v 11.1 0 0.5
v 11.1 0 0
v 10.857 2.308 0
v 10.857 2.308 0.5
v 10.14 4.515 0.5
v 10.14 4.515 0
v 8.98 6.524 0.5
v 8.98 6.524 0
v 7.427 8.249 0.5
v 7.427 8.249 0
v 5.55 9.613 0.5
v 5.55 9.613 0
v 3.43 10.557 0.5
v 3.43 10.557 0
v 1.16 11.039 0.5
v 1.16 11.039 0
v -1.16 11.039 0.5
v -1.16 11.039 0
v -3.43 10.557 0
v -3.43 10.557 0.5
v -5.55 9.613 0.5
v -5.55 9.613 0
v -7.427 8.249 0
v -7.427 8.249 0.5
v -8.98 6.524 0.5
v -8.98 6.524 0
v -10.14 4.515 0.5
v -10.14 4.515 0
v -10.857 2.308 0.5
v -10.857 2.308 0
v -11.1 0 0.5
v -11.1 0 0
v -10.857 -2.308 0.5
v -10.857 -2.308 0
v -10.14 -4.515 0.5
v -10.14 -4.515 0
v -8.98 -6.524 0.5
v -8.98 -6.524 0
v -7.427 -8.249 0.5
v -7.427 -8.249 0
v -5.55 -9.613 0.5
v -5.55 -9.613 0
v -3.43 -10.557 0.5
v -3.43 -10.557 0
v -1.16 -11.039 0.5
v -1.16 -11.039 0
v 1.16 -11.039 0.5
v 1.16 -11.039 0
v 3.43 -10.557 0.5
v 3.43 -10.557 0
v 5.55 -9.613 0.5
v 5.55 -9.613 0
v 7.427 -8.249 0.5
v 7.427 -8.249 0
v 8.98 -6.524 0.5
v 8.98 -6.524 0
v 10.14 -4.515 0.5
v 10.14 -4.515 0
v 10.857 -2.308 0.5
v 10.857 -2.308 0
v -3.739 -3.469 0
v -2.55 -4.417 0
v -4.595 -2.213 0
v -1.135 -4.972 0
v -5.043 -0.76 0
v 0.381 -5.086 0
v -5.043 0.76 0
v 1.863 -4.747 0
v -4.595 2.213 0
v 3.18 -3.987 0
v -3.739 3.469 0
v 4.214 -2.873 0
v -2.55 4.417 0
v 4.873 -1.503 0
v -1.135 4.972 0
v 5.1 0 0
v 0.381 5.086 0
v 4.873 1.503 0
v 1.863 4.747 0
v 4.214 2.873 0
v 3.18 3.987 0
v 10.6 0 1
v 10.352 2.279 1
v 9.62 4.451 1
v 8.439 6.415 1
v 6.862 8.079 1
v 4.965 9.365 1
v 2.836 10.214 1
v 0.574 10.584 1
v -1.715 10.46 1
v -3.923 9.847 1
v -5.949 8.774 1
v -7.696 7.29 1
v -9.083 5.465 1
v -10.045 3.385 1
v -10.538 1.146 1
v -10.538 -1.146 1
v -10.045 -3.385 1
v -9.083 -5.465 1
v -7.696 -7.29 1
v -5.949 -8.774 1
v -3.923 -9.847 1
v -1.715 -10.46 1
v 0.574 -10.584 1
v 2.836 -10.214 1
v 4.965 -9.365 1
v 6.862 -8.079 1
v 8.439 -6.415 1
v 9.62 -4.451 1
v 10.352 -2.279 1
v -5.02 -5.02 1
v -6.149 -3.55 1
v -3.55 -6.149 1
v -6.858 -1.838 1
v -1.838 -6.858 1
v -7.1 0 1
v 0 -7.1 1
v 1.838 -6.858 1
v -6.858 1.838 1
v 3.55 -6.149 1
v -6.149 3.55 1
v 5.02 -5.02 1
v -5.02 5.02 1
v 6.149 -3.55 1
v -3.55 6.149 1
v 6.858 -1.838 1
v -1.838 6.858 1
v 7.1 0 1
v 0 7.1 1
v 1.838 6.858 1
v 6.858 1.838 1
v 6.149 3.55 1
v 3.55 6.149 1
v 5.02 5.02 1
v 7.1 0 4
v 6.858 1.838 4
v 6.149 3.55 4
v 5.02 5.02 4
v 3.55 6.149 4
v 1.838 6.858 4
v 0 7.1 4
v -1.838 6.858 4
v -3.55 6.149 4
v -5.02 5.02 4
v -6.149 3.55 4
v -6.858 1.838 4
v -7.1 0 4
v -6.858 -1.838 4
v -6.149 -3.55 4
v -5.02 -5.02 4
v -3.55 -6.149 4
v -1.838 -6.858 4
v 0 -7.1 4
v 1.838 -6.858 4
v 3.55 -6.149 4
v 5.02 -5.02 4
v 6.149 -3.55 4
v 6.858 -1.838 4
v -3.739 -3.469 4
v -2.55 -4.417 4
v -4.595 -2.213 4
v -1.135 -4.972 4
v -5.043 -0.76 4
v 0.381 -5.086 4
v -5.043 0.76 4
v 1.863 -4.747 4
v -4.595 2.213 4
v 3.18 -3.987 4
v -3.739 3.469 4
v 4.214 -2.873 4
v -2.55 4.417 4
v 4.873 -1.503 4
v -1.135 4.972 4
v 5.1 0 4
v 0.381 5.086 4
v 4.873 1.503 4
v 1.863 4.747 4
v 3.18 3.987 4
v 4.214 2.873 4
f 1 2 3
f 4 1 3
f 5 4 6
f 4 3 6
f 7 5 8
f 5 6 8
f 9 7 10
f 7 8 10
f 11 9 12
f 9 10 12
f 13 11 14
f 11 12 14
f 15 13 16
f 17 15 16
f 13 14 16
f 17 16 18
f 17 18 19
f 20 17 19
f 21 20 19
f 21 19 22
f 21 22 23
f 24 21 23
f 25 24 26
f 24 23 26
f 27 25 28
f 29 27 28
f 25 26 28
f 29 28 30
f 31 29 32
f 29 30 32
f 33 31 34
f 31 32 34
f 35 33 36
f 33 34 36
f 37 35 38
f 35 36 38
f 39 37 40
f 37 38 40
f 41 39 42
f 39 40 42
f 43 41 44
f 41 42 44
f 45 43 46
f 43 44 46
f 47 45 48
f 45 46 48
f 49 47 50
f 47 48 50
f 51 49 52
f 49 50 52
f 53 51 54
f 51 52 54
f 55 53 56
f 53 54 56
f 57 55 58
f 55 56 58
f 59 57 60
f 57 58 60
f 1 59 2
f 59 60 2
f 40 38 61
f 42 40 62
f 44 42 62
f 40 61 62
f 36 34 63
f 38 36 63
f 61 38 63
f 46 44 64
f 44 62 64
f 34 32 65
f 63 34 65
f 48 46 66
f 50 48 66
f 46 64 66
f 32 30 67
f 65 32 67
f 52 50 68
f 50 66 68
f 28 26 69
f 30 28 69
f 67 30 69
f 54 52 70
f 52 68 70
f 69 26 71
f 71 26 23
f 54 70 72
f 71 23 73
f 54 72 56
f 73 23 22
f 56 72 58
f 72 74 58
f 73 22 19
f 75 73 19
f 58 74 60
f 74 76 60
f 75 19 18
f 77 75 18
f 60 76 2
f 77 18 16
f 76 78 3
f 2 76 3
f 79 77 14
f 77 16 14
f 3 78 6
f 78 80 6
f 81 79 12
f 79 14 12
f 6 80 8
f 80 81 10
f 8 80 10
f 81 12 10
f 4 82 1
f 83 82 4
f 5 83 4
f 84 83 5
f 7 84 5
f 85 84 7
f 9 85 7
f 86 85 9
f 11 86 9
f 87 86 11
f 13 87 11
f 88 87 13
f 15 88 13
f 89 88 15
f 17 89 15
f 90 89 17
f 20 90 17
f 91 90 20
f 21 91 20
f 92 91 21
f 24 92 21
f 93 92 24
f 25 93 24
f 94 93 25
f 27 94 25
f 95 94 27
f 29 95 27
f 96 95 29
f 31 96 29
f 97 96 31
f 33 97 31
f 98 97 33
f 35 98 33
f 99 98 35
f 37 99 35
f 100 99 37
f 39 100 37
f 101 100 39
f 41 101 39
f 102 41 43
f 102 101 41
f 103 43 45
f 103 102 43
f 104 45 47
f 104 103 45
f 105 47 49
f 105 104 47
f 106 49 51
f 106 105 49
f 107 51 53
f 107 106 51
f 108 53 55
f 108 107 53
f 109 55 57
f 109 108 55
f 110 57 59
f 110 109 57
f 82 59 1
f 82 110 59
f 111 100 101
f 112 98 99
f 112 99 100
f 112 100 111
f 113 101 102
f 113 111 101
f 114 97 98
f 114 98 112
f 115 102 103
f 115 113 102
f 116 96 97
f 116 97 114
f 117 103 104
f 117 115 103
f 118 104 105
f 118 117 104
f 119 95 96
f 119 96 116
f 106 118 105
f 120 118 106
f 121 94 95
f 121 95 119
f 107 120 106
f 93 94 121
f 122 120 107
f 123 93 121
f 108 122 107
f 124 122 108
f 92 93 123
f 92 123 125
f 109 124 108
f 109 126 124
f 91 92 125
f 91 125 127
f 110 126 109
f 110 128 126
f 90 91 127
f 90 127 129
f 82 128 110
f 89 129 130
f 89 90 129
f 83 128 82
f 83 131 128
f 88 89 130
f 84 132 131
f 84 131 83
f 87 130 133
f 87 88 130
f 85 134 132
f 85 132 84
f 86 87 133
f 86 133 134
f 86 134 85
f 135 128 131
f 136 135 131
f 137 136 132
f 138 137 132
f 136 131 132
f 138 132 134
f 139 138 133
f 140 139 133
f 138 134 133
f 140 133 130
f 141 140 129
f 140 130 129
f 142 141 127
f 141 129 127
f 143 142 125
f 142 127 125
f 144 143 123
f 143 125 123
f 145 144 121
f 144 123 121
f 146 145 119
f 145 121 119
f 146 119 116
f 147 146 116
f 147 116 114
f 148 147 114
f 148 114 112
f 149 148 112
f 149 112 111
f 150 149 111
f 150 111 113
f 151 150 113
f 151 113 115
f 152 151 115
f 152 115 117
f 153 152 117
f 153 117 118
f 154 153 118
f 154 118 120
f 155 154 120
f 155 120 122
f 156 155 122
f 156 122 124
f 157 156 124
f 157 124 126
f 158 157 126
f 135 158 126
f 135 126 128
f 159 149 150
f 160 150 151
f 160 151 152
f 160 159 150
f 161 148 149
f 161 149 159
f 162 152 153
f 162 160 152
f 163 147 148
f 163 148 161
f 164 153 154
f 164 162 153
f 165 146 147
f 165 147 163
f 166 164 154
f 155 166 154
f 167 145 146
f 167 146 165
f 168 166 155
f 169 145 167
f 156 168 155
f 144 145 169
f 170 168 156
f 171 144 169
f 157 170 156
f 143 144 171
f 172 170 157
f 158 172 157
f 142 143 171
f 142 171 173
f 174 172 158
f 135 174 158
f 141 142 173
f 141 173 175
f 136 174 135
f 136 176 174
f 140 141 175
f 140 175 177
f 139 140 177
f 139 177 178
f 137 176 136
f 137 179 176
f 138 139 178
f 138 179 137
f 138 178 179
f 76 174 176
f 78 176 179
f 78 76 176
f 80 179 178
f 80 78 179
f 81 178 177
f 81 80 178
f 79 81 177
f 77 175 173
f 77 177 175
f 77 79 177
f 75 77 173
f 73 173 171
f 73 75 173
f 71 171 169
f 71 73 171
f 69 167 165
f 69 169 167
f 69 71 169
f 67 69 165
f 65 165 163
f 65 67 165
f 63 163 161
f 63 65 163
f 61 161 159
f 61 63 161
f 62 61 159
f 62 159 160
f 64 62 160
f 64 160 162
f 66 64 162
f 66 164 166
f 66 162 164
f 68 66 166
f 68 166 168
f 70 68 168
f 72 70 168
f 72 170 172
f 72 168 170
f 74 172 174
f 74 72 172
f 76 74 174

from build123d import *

# Parameters (mm, degrees)
F0_R     = 7.1
F0_R_2   = 5.1
F0_R_3   = 1.6
F1_DEPTH = 4
F2_DEPTH = 8.2
F0_R_4   = 11.1
F3_DEPTH = 1
F4_SIZE  = 0.5


with BuildPart() as f1:
    # F0 (on Top) → F1 (new body)
    with BuildSketch(Plane.XY):
        Circle(F0_R)
        Circle(F0_R_2, mode=Mode.SUBTRACT)
        Circle(F0_R_2)
        Circle(F0_R_3, mode=Mode.SUBTRACT)
    extrude(amount=F1_DEPTH)

    # F0 (on Top) → F2 (cut)
    with BuildSketch(Plane.XY):
        Circle(F0_R_2)
        Circle(F0_R_3, mode=Mode.SUBTRACT)
    extrude(amount=F2_DEPTH, mode=Mode.SUBTRACT)

    # F0 (on Top) → F3 (join)
    with BuildSketch(Plane.XY):
        Circle(F0_R_4)
        Circle(F0_R, mode=Mode.SUBTRACT)
    extrude(amount=F3_DEPTH)

    # F4
    f4_edges = [f1.edges().sort_by_distance(p)[0] for p in [
        (-11.1, 0, 1),
    ]]
    chamfer(f4_edges, length=F4_SIZE)


solid = f1.part
